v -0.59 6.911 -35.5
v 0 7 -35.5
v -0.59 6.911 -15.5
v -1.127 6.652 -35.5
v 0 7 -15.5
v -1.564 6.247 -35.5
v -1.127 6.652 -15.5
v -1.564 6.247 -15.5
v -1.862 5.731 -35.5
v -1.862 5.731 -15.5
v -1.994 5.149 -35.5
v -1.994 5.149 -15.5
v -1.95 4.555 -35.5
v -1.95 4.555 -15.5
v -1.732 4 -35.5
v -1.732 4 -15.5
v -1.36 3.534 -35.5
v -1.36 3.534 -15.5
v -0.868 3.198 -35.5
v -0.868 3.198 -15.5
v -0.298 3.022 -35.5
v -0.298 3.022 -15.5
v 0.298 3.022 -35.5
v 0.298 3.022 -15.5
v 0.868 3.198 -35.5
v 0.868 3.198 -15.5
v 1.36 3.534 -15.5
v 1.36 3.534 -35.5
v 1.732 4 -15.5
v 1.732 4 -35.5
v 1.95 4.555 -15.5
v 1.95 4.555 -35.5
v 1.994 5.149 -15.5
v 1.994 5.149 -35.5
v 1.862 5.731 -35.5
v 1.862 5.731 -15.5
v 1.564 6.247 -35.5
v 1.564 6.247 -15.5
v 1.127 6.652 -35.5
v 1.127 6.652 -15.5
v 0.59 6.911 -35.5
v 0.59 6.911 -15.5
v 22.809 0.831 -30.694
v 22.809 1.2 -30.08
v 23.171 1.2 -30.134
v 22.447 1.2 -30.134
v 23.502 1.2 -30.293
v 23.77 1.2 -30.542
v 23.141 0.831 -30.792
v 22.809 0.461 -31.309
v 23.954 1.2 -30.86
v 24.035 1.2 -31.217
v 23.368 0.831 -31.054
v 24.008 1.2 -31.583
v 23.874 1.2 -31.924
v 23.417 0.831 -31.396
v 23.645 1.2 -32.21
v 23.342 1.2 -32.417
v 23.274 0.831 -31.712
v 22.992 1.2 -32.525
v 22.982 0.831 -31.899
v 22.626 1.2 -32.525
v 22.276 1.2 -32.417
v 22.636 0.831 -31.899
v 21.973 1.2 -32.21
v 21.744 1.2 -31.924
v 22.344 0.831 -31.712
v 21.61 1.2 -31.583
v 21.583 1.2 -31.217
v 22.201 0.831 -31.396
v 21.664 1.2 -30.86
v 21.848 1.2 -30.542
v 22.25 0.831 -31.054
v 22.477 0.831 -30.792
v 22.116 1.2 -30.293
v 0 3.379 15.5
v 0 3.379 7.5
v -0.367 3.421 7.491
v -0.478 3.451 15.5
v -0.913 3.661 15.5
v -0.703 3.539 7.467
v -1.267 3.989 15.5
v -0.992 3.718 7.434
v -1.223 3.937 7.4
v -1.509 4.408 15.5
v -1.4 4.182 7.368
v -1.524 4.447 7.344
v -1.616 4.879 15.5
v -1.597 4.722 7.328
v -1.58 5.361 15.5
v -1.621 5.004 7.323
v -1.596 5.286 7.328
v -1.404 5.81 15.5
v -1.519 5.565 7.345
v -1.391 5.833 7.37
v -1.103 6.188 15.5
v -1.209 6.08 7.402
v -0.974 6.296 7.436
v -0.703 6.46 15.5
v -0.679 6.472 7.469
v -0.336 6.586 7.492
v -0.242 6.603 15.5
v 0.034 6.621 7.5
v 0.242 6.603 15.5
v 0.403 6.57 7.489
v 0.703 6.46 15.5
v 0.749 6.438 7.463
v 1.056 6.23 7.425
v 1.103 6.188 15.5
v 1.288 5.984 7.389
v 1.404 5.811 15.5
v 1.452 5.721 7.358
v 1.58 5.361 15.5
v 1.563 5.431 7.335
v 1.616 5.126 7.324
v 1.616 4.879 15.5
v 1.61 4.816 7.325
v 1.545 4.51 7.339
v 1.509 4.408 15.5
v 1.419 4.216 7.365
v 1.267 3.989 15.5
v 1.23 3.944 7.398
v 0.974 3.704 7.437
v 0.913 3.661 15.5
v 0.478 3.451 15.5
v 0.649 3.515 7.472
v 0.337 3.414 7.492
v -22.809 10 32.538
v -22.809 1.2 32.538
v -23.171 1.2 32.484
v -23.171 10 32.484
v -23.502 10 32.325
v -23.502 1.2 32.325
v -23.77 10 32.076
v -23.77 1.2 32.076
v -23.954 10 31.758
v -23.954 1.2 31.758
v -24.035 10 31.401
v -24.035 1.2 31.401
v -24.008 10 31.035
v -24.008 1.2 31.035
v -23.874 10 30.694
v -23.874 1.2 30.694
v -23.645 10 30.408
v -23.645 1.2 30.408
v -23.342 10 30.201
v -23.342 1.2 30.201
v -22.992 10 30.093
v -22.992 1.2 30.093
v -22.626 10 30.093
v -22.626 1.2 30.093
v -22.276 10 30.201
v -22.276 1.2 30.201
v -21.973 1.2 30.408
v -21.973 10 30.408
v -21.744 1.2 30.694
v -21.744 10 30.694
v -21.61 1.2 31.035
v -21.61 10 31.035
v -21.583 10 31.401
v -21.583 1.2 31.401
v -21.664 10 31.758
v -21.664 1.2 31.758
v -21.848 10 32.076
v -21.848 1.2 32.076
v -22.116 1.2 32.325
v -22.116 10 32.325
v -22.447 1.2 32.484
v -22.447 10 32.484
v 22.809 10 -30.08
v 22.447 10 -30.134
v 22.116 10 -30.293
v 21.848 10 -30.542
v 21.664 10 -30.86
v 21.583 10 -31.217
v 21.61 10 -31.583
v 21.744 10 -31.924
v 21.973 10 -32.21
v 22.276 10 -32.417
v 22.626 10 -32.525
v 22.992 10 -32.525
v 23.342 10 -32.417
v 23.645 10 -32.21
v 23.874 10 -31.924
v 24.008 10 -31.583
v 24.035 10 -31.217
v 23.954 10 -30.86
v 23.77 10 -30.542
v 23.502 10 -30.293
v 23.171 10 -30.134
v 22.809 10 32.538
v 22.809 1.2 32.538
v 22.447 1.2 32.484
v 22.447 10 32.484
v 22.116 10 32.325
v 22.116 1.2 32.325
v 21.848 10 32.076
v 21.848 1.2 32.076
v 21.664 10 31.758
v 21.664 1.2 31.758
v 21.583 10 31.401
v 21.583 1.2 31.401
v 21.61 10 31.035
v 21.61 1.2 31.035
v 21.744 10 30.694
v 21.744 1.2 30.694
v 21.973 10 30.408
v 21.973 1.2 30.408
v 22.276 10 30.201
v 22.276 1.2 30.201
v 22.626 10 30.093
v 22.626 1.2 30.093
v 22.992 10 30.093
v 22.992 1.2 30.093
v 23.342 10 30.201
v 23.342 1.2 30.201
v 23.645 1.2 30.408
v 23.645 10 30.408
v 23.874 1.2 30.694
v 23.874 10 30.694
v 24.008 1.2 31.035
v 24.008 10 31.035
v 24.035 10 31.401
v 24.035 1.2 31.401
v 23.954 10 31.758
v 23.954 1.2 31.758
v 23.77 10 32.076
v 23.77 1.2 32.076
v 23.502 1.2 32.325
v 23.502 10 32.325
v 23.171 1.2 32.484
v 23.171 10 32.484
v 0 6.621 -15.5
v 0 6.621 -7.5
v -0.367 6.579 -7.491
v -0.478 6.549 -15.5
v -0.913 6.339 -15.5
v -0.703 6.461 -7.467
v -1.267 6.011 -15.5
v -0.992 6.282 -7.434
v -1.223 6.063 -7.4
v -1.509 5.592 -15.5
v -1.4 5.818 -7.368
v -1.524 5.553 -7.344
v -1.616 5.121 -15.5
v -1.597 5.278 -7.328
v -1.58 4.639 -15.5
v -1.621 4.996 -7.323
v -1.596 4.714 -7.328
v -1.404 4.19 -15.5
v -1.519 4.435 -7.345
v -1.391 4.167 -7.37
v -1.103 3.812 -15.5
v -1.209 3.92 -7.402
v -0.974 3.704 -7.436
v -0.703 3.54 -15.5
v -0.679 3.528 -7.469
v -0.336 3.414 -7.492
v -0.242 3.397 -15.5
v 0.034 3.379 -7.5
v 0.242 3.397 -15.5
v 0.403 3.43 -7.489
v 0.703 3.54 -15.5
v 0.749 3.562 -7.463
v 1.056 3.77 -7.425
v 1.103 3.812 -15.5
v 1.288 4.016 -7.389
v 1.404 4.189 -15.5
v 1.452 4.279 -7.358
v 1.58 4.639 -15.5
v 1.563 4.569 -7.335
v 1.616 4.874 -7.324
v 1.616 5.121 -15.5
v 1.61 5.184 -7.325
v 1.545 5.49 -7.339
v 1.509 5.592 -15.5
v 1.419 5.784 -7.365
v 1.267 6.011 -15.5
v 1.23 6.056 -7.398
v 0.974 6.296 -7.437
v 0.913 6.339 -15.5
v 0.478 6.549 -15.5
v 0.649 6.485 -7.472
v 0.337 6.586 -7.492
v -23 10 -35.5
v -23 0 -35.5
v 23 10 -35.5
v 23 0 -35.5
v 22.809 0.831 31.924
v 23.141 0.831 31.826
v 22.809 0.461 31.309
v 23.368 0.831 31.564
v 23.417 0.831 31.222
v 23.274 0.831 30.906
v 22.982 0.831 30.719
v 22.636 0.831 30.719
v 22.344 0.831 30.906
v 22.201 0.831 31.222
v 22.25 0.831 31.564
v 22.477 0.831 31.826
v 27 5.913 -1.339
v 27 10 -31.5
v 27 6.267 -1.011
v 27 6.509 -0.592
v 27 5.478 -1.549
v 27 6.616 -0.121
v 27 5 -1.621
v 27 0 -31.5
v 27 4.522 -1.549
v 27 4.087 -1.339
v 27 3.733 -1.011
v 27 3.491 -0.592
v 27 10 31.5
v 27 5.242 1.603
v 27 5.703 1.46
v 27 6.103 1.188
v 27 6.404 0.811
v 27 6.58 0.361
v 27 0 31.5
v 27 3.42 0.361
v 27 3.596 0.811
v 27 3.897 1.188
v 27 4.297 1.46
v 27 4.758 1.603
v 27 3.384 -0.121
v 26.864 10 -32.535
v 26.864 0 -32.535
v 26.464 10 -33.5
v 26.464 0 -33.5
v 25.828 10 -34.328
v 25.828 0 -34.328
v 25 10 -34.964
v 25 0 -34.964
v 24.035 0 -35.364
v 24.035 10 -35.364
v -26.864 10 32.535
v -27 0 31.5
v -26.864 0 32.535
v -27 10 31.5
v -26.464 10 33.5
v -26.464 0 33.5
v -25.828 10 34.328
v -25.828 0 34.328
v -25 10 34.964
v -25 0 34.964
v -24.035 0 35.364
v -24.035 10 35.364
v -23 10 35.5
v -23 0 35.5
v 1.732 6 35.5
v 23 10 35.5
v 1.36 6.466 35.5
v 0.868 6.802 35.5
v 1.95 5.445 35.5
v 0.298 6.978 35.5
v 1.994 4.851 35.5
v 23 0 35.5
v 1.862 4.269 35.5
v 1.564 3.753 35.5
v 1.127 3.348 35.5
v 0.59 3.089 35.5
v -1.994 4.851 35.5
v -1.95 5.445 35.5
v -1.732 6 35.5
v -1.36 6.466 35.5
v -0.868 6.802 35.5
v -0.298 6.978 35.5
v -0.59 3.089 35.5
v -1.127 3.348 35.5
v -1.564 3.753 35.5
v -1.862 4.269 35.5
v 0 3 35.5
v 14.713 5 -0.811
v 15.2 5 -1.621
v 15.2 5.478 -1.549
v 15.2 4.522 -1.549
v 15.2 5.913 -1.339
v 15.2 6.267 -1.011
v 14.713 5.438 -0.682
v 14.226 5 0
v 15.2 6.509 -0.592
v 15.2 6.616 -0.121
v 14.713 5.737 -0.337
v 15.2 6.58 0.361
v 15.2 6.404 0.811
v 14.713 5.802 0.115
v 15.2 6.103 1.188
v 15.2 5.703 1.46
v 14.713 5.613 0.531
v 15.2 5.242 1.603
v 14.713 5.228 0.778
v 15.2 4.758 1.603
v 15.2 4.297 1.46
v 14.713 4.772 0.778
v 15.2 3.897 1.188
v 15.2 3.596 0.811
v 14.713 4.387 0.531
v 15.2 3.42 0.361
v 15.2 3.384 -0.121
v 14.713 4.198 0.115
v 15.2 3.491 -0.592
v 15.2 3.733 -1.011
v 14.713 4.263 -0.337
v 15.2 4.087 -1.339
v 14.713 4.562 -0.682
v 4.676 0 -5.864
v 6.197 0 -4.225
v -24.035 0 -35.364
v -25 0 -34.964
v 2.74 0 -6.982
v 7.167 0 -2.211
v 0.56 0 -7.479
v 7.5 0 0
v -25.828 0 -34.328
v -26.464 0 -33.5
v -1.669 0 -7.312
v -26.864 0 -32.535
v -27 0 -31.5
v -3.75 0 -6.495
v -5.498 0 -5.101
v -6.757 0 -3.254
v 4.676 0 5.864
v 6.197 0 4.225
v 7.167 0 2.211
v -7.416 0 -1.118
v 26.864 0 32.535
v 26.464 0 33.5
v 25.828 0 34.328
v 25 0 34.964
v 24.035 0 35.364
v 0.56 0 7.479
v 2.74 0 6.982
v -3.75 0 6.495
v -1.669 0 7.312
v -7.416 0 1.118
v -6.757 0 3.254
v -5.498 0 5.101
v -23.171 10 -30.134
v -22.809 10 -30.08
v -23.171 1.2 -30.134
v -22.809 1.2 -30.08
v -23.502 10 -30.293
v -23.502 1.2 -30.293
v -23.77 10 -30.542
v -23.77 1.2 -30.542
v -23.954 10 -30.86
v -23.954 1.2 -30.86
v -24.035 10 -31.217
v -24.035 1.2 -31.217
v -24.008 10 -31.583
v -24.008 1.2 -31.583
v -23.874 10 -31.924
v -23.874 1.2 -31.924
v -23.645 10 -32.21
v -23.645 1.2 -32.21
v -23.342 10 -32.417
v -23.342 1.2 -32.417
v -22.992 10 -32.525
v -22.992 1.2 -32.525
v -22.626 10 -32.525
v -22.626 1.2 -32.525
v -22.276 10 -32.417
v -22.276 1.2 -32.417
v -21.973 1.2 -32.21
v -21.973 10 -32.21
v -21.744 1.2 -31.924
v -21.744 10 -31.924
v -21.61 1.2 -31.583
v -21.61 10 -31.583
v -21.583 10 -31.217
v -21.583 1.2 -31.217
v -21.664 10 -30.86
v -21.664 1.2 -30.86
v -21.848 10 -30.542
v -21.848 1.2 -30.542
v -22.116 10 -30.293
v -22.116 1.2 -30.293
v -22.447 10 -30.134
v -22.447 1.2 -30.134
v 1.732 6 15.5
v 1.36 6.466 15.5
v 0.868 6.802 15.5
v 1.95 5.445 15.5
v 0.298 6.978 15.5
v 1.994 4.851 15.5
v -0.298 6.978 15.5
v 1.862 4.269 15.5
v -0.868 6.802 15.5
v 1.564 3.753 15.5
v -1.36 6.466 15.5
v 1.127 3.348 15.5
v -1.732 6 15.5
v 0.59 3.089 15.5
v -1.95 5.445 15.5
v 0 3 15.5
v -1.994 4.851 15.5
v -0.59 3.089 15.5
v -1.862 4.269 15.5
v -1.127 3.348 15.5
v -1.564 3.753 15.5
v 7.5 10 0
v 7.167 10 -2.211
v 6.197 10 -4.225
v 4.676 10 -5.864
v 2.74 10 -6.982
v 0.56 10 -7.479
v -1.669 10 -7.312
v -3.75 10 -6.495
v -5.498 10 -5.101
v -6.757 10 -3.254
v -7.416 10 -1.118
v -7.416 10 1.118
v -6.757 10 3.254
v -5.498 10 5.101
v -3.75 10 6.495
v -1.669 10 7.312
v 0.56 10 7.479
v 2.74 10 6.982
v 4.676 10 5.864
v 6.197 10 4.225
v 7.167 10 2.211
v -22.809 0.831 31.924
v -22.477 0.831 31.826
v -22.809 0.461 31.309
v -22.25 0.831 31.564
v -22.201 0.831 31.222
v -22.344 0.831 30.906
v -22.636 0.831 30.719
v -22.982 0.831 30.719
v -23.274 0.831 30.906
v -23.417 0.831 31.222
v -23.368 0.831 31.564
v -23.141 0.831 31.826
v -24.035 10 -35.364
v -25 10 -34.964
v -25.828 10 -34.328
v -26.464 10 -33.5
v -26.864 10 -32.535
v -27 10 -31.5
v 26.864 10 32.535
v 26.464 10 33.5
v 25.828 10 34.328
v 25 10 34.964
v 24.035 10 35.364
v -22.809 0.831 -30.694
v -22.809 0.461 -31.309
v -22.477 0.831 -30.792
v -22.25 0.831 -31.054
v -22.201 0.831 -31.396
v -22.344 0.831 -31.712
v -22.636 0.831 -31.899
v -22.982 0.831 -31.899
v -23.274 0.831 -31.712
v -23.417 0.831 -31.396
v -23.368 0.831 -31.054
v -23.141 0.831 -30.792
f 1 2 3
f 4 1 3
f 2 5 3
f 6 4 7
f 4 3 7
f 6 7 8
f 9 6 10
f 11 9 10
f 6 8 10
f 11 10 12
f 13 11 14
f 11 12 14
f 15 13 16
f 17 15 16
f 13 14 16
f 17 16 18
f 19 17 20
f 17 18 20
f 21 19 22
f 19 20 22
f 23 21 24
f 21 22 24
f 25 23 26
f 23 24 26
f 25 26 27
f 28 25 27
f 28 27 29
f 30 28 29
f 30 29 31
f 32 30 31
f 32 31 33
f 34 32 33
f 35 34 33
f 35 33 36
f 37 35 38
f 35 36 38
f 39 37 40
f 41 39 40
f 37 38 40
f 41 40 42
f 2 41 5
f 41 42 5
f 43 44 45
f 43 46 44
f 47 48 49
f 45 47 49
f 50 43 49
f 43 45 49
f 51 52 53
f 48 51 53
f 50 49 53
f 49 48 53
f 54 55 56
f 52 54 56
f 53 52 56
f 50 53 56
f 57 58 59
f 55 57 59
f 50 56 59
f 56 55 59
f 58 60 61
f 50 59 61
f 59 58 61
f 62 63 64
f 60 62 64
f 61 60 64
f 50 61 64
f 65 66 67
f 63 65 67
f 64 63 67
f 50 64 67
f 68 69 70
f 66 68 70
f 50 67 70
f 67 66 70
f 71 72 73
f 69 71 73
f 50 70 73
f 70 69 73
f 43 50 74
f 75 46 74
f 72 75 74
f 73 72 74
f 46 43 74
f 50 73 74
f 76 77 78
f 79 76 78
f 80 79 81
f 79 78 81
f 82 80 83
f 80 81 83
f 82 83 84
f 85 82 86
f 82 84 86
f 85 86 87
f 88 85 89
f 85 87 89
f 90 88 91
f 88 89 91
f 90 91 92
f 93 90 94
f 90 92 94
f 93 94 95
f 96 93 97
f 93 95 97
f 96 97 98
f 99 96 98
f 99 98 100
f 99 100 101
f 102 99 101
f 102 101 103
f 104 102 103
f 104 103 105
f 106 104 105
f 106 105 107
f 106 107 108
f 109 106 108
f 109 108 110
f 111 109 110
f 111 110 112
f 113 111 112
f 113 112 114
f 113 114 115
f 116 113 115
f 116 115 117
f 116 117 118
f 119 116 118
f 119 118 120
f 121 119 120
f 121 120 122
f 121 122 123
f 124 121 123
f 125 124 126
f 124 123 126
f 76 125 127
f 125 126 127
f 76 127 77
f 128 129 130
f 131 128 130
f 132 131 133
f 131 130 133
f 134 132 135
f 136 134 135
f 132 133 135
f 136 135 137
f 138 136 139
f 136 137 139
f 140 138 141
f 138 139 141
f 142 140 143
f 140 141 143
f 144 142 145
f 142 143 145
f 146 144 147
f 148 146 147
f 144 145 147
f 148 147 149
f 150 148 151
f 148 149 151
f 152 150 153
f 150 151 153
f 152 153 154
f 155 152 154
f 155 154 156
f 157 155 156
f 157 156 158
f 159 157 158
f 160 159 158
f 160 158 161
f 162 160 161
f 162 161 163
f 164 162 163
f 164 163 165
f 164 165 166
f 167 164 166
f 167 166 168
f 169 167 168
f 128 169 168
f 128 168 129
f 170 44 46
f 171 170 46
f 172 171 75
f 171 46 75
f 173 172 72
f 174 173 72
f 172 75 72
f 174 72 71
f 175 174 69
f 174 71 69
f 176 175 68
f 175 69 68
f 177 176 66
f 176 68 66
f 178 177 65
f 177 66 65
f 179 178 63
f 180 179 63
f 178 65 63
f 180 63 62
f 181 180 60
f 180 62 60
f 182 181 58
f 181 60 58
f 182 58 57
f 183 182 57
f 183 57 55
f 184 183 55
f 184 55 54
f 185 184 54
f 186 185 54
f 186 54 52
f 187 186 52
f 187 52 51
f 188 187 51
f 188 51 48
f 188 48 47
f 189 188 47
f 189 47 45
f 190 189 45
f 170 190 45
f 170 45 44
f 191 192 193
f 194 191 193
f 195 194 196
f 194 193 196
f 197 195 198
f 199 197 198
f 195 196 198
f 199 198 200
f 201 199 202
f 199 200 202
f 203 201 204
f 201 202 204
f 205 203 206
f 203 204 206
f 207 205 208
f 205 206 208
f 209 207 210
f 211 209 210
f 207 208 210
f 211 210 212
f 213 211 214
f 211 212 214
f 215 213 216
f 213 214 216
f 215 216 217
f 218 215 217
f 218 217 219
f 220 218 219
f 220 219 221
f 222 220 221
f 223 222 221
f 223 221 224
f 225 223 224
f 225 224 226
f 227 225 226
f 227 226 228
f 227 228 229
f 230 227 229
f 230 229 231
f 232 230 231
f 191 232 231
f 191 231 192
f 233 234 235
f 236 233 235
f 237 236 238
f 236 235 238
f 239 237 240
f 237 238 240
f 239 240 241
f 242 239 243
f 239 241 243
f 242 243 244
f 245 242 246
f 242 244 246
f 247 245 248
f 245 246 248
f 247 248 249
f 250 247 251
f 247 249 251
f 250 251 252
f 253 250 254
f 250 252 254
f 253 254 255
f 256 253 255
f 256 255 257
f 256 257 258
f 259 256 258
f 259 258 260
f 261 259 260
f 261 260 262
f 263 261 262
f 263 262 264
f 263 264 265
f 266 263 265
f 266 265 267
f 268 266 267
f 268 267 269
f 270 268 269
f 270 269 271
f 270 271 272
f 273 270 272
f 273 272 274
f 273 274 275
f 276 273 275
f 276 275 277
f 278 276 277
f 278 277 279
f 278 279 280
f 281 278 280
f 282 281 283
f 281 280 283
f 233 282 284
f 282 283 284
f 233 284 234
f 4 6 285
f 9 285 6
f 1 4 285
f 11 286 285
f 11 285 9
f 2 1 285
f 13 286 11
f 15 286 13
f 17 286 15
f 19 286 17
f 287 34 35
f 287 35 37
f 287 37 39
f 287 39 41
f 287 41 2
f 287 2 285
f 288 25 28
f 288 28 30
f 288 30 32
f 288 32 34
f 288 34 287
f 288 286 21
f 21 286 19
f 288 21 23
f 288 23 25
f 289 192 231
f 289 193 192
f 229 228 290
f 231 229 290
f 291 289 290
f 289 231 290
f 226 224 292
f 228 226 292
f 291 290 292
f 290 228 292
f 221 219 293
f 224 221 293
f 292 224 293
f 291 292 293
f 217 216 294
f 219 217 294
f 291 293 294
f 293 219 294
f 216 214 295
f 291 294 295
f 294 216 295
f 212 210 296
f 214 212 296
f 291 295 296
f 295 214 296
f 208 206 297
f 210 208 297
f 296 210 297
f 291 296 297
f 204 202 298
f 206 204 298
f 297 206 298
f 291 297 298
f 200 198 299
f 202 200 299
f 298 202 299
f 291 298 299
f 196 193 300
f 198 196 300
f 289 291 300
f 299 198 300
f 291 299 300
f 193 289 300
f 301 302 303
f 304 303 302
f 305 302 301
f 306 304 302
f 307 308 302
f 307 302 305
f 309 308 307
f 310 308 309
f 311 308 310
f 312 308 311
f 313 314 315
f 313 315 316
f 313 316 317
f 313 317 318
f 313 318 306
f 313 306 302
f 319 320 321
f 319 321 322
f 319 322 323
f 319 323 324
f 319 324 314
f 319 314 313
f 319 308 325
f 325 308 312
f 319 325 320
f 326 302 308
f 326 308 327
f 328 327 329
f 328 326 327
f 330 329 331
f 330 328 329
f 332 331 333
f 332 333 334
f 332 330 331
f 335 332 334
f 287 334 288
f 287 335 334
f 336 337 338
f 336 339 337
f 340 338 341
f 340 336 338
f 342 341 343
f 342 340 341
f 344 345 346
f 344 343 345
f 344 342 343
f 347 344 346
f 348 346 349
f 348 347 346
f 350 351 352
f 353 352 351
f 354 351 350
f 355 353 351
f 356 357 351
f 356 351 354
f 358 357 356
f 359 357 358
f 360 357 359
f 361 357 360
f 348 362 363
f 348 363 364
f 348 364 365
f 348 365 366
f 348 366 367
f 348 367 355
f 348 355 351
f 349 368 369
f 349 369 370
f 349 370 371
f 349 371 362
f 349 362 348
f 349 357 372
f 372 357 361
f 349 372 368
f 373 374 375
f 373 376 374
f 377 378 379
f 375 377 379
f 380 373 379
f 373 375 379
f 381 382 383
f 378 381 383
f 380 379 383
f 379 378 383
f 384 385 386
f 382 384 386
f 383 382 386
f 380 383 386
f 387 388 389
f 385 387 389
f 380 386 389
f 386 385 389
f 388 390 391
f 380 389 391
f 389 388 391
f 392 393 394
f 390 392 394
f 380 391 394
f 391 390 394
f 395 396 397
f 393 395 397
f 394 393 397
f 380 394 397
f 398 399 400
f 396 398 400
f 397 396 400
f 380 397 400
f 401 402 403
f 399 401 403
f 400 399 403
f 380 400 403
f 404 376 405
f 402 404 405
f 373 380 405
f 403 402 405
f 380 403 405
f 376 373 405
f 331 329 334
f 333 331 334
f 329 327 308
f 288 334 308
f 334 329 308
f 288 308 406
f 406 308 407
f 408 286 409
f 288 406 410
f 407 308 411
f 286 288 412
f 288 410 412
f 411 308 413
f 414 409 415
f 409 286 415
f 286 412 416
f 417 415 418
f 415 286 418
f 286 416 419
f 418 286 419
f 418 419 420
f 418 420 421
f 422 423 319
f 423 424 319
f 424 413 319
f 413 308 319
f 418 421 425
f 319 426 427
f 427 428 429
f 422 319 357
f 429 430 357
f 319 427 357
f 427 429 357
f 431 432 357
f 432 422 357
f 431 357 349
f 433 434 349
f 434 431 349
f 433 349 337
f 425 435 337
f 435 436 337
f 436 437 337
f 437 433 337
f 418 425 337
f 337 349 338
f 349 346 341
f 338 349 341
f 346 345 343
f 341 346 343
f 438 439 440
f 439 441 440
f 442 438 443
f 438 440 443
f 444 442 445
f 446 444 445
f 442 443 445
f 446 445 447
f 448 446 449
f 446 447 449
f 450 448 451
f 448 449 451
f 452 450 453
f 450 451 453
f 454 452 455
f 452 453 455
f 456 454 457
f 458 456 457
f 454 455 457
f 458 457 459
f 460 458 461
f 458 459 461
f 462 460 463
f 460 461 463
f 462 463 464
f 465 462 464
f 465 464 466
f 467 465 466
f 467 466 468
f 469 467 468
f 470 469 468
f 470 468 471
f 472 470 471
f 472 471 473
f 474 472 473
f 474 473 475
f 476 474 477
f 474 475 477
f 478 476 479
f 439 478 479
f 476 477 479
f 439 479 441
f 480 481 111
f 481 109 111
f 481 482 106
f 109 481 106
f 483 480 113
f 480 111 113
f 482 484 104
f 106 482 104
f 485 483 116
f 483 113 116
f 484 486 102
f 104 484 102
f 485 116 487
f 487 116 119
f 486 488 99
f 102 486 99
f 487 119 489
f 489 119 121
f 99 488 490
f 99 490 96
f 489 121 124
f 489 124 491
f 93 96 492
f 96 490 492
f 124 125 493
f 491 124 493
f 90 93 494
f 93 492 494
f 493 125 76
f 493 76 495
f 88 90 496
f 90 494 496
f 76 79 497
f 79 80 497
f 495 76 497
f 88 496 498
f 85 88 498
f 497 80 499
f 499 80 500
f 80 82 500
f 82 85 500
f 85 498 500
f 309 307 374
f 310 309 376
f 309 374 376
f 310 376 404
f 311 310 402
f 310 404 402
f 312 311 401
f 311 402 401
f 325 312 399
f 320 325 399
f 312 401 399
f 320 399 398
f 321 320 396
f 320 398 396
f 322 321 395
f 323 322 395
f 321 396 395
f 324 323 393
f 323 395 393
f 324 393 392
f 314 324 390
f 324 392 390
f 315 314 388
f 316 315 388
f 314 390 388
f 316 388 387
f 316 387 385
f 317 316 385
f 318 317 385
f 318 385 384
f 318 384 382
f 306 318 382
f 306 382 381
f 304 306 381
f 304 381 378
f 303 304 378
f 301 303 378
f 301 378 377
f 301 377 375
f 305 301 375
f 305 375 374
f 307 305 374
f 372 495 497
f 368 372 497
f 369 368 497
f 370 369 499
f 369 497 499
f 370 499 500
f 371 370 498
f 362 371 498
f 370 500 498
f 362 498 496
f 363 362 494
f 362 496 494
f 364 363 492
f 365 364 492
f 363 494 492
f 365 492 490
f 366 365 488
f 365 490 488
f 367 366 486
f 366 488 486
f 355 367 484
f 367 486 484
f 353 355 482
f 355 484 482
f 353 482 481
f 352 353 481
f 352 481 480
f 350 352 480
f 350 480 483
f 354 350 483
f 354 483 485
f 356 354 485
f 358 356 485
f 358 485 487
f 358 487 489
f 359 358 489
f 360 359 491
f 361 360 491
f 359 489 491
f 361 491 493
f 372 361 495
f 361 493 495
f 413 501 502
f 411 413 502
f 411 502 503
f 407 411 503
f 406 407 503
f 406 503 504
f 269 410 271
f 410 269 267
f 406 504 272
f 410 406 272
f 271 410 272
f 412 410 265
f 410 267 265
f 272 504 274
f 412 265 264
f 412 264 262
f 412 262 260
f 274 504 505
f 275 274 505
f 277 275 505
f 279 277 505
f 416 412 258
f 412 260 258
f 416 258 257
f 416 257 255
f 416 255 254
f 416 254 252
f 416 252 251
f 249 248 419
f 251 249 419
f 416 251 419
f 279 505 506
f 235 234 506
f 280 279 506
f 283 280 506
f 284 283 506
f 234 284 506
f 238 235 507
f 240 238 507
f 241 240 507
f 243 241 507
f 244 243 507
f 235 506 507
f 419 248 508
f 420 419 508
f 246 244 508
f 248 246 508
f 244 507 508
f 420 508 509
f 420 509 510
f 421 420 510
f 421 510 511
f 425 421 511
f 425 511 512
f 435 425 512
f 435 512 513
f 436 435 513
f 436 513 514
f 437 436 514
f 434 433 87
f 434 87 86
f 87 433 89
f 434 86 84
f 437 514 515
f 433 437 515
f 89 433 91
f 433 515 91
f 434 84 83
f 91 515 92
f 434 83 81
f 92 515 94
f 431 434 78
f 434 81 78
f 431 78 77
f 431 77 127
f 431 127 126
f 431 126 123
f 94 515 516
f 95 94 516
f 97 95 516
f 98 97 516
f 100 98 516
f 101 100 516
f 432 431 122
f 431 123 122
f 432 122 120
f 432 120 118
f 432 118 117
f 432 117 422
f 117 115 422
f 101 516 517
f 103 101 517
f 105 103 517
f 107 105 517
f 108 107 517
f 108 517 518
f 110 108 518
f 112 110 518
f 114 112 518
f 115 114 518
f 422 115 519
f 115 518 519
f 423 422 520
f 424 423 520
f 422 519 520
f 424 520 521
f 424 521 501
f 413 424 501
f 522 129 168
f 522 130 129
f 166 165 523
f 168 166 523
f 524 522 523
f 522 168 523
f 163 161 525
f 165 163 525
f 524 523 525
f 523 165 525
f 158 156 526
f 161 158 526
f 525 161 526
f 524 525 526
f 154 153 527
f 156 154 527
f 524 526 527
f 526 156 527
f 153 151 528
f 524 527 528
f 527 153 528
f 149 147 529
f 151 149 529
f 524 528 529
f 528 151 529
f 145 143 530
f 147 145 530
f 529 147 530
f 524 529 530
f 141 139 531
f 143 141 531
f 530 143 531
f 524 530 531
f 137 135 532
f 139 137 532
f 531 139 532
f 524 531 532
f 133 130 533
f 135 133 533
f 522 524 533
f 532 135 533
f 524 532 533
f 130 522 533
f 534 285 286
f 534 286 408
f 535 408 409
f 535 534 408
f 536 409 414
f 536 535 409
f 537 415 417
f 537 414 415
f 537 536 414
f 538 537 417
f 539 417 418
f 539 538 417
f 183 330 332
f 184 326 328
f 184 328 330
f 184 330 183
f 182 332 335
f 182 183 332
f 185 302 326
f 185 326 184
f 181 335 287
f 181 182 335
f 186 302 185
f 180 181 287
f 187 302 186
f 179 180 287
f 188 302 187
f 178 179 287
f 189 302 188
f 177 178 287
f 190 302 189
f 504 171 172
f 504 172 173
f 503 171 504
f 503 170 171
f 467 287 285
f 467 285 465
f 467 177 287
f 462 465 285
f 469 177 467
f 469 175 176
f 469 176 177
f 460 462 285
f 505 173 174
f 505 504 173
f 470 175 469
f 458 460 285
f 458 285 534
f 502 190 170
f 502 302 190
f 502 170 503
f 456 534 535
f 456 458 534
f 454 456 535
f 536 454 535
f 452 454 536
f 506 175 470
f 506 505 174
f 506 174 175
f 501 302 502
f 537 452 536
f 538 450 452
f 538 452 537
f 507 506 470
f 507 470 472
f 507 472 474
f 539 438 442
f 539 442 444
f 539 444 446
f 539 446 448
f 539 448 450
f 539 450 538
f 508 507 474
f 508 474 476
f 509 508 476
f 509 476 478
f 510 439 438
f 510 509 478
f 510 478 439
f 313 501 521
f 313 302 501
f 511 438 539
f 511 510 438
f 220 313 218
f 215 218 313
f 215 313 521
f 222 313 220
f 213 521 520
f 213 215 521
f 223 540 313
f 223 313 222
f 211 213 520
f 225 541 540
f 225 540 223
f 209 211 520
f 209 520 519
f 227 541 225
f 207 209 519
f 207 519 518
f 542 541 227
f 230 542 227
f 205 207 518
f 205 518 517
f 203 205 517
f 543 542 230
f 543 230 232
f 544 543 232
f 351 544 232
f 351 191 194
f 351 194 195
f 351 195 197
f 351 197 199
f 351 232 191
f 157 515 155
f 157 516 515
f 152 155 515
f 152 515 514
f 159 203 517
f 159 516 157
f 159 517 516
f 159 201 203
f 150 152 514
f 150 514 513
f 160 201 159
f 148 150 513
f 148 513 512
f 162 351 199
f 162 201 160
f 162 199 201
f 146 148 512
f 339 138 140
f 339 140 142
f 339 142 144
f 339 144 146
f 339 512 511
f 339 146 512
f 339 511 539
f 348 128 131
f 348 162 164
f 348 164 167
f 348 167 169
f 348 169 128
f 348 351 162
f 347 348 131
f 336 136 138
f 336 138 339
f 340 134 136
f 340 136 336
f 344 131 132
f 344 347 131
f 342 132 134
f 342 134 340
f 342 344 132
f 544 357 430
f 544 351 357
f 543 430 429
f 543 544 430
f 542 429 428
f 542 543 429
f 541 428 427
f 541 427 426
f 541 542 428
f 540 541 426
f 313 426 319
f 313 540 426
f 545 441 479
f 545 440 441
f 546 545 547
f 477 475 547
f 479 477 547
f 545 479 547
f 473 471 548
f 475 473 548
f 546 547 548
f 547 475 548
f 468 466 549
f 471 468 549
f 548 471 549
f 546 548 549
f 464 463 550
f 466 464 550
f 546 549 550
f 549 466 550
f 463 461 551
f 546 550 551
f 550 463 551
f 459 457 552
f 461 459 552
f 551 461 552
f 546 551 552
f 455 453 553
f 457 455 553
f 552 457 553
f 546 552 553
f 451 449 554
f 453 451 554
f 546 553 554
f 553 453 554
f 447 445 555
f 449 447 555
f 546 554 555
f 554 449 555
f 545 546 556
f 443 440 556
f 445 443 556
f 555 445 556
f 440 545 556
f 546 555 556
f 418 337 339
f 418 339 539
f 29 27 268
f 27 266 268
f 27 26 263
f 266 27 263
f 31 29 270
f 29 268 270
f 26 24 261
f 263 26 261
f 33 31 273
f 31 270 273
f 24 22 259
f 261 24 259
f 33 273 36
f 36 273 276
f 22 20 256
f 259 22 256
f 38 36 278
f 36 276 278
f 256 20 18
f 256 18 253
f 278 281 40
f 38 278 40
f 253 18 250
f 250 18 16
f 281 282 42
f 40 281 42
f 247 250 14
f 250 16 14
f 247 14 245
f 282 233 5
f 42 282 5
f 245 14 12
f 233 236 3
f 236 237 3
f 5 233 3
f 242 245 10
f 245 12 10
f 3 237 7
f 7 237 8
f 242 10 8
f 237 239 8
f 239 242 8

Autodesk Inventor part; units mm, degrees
ref_plane "YZ Plane" through (0, 0, 0) normal (1, 0, 0) x (0, 1, 0)
ref_plane "XZ Plane" through (0, 0, 0) normal (0, 1, 0) x (-1, 0, 0)
ref_plane "XY Plane" through (0, 0, 0) normal (0, 0, 1) x (1, 0, 0)
sketch "Sketch9" plane through (0, 0, 0) normal (0, 1, 0) x (-1, 0, 0)
  line L0 (-27, 35.5) -> (27, 35.5)
  line L1 (27, 35.5) -> (27, -35.5)
  line L2 (27, -35.5) -> (-27, -35.5)
  line L3 (-27, -35.5) -> (-27, 35.5)
  line L4 (-27, 35.5) -> (27, -35.5) construction
  line L5 (27, 35.5) -> (-27, -35.5) construction
  point P0 (0, 0)
  dimension "d39" = 54
  dimension "d40" = 71
extrude "Extrusion4" add sketch "Sketch9" along normal blind 10
sketch "Sketch10" plane through (0, 10, 0) normal (0, 1, 0) x (1, 0, 0)
  circle A0 centre (0, 0) radius 7.5
  dimension "d43" = 15
extrude "Extrusion5" cut sketch "Sketch10" against normal blind 10
sketch "Sketch11" plane through (27, 0, 35.5) normal (1, 0, 0) x (0, 0, -1)
  point P0 (35.5, 0)
  point P1 (35.5, 5)
hole "Hole5" at (27, 5, 0) direction (-1, 0, 0) diameter 3.242 depth 11.8 tip angle 118 thread size "M4x0.7" class "6H" standard "ANSI Metric M Profile"
sketch "Sketch12" plane through (0, 10, 0) normal (0, 1, 0) x (1, 0, 0)
  point P0 (0, 0)
sketch "Sketch13" plane through (0, 10, 0) normal (0, 1, 0) x (1, 0, 0)
  point P0 (0, 0)
  point P1 (22.809, -31.309)
  point P2 (-22.809, 31.309)
  point P3 (-22.809, -31.309)
  point P4 (22.809, 31.309)
hole "Hole6" at (-22.809, 10, 31.309) at (-22.809, 10, -31.309) at (22.809, 10, -31.309) at (22.809, 10, 31.309) direction (0, -1, 0) diameter 2.459 depth 8.8 tip angle 118 thread size "M3x0.5" class "6H" standard "ANSI Metric M Profile"
fillet "Fillet3" radius 4 4 edges at (-27, 5, -35.5) (-27, 5, 35.5) (27, 5, -35.5) (27, 5, 35.5)
sketch "Sketch14" plane through (23, 0, -35.5) normal (0, 0, -1) x (-1, 0, 0)
  point P0 (23, 0)
  point P1 (23, 5)
sketch "Sketch15" plane through (-23, 0, 35.5) normal (0, 0, 1) x (1, 0, 0)
  point P0 (23, 0)
  point P1 (23, 5)
hole "Hole7" at (0, 5, 35.5) direction (0, 0, -1) diameter 4 depth 20
hole "Hole8" at (0, 5, -35.5) direction (0, 0, 1) diameter 4 depth 20
sketch "Sketch16" plane through (0, 5, 15.5) normal (0, 0, 1) x (1, 0, 0)
  point P0 (0, -5)
  point P1 (0, 0)
sketch "Sketch17" plane through (0, 5, -15.5) normal (0, 0, -1) x (-1, 0, 0)
  point P0 (0, -5)
  point P1 (0, 0)
hole "Hole9" at (0, 5, -15.5) direction (0, 0, 1) diameter 3.242 depth 11.8 thread size "M4x0.7" class "6H" standard "ANSI Metric M Profile"
hole "Hole10" at (0, 5, 15.5) direction (0, 0, -1) diameter 3.242 depth 11.8 thread size "M4x0.7" class "6H" standard "ANSI Metric M Profile"
equation "\"z\" = 71"
equation "\"x\" = 54"
equation "\"corner\" = 4"
properties part number "CardMount_sjc"
